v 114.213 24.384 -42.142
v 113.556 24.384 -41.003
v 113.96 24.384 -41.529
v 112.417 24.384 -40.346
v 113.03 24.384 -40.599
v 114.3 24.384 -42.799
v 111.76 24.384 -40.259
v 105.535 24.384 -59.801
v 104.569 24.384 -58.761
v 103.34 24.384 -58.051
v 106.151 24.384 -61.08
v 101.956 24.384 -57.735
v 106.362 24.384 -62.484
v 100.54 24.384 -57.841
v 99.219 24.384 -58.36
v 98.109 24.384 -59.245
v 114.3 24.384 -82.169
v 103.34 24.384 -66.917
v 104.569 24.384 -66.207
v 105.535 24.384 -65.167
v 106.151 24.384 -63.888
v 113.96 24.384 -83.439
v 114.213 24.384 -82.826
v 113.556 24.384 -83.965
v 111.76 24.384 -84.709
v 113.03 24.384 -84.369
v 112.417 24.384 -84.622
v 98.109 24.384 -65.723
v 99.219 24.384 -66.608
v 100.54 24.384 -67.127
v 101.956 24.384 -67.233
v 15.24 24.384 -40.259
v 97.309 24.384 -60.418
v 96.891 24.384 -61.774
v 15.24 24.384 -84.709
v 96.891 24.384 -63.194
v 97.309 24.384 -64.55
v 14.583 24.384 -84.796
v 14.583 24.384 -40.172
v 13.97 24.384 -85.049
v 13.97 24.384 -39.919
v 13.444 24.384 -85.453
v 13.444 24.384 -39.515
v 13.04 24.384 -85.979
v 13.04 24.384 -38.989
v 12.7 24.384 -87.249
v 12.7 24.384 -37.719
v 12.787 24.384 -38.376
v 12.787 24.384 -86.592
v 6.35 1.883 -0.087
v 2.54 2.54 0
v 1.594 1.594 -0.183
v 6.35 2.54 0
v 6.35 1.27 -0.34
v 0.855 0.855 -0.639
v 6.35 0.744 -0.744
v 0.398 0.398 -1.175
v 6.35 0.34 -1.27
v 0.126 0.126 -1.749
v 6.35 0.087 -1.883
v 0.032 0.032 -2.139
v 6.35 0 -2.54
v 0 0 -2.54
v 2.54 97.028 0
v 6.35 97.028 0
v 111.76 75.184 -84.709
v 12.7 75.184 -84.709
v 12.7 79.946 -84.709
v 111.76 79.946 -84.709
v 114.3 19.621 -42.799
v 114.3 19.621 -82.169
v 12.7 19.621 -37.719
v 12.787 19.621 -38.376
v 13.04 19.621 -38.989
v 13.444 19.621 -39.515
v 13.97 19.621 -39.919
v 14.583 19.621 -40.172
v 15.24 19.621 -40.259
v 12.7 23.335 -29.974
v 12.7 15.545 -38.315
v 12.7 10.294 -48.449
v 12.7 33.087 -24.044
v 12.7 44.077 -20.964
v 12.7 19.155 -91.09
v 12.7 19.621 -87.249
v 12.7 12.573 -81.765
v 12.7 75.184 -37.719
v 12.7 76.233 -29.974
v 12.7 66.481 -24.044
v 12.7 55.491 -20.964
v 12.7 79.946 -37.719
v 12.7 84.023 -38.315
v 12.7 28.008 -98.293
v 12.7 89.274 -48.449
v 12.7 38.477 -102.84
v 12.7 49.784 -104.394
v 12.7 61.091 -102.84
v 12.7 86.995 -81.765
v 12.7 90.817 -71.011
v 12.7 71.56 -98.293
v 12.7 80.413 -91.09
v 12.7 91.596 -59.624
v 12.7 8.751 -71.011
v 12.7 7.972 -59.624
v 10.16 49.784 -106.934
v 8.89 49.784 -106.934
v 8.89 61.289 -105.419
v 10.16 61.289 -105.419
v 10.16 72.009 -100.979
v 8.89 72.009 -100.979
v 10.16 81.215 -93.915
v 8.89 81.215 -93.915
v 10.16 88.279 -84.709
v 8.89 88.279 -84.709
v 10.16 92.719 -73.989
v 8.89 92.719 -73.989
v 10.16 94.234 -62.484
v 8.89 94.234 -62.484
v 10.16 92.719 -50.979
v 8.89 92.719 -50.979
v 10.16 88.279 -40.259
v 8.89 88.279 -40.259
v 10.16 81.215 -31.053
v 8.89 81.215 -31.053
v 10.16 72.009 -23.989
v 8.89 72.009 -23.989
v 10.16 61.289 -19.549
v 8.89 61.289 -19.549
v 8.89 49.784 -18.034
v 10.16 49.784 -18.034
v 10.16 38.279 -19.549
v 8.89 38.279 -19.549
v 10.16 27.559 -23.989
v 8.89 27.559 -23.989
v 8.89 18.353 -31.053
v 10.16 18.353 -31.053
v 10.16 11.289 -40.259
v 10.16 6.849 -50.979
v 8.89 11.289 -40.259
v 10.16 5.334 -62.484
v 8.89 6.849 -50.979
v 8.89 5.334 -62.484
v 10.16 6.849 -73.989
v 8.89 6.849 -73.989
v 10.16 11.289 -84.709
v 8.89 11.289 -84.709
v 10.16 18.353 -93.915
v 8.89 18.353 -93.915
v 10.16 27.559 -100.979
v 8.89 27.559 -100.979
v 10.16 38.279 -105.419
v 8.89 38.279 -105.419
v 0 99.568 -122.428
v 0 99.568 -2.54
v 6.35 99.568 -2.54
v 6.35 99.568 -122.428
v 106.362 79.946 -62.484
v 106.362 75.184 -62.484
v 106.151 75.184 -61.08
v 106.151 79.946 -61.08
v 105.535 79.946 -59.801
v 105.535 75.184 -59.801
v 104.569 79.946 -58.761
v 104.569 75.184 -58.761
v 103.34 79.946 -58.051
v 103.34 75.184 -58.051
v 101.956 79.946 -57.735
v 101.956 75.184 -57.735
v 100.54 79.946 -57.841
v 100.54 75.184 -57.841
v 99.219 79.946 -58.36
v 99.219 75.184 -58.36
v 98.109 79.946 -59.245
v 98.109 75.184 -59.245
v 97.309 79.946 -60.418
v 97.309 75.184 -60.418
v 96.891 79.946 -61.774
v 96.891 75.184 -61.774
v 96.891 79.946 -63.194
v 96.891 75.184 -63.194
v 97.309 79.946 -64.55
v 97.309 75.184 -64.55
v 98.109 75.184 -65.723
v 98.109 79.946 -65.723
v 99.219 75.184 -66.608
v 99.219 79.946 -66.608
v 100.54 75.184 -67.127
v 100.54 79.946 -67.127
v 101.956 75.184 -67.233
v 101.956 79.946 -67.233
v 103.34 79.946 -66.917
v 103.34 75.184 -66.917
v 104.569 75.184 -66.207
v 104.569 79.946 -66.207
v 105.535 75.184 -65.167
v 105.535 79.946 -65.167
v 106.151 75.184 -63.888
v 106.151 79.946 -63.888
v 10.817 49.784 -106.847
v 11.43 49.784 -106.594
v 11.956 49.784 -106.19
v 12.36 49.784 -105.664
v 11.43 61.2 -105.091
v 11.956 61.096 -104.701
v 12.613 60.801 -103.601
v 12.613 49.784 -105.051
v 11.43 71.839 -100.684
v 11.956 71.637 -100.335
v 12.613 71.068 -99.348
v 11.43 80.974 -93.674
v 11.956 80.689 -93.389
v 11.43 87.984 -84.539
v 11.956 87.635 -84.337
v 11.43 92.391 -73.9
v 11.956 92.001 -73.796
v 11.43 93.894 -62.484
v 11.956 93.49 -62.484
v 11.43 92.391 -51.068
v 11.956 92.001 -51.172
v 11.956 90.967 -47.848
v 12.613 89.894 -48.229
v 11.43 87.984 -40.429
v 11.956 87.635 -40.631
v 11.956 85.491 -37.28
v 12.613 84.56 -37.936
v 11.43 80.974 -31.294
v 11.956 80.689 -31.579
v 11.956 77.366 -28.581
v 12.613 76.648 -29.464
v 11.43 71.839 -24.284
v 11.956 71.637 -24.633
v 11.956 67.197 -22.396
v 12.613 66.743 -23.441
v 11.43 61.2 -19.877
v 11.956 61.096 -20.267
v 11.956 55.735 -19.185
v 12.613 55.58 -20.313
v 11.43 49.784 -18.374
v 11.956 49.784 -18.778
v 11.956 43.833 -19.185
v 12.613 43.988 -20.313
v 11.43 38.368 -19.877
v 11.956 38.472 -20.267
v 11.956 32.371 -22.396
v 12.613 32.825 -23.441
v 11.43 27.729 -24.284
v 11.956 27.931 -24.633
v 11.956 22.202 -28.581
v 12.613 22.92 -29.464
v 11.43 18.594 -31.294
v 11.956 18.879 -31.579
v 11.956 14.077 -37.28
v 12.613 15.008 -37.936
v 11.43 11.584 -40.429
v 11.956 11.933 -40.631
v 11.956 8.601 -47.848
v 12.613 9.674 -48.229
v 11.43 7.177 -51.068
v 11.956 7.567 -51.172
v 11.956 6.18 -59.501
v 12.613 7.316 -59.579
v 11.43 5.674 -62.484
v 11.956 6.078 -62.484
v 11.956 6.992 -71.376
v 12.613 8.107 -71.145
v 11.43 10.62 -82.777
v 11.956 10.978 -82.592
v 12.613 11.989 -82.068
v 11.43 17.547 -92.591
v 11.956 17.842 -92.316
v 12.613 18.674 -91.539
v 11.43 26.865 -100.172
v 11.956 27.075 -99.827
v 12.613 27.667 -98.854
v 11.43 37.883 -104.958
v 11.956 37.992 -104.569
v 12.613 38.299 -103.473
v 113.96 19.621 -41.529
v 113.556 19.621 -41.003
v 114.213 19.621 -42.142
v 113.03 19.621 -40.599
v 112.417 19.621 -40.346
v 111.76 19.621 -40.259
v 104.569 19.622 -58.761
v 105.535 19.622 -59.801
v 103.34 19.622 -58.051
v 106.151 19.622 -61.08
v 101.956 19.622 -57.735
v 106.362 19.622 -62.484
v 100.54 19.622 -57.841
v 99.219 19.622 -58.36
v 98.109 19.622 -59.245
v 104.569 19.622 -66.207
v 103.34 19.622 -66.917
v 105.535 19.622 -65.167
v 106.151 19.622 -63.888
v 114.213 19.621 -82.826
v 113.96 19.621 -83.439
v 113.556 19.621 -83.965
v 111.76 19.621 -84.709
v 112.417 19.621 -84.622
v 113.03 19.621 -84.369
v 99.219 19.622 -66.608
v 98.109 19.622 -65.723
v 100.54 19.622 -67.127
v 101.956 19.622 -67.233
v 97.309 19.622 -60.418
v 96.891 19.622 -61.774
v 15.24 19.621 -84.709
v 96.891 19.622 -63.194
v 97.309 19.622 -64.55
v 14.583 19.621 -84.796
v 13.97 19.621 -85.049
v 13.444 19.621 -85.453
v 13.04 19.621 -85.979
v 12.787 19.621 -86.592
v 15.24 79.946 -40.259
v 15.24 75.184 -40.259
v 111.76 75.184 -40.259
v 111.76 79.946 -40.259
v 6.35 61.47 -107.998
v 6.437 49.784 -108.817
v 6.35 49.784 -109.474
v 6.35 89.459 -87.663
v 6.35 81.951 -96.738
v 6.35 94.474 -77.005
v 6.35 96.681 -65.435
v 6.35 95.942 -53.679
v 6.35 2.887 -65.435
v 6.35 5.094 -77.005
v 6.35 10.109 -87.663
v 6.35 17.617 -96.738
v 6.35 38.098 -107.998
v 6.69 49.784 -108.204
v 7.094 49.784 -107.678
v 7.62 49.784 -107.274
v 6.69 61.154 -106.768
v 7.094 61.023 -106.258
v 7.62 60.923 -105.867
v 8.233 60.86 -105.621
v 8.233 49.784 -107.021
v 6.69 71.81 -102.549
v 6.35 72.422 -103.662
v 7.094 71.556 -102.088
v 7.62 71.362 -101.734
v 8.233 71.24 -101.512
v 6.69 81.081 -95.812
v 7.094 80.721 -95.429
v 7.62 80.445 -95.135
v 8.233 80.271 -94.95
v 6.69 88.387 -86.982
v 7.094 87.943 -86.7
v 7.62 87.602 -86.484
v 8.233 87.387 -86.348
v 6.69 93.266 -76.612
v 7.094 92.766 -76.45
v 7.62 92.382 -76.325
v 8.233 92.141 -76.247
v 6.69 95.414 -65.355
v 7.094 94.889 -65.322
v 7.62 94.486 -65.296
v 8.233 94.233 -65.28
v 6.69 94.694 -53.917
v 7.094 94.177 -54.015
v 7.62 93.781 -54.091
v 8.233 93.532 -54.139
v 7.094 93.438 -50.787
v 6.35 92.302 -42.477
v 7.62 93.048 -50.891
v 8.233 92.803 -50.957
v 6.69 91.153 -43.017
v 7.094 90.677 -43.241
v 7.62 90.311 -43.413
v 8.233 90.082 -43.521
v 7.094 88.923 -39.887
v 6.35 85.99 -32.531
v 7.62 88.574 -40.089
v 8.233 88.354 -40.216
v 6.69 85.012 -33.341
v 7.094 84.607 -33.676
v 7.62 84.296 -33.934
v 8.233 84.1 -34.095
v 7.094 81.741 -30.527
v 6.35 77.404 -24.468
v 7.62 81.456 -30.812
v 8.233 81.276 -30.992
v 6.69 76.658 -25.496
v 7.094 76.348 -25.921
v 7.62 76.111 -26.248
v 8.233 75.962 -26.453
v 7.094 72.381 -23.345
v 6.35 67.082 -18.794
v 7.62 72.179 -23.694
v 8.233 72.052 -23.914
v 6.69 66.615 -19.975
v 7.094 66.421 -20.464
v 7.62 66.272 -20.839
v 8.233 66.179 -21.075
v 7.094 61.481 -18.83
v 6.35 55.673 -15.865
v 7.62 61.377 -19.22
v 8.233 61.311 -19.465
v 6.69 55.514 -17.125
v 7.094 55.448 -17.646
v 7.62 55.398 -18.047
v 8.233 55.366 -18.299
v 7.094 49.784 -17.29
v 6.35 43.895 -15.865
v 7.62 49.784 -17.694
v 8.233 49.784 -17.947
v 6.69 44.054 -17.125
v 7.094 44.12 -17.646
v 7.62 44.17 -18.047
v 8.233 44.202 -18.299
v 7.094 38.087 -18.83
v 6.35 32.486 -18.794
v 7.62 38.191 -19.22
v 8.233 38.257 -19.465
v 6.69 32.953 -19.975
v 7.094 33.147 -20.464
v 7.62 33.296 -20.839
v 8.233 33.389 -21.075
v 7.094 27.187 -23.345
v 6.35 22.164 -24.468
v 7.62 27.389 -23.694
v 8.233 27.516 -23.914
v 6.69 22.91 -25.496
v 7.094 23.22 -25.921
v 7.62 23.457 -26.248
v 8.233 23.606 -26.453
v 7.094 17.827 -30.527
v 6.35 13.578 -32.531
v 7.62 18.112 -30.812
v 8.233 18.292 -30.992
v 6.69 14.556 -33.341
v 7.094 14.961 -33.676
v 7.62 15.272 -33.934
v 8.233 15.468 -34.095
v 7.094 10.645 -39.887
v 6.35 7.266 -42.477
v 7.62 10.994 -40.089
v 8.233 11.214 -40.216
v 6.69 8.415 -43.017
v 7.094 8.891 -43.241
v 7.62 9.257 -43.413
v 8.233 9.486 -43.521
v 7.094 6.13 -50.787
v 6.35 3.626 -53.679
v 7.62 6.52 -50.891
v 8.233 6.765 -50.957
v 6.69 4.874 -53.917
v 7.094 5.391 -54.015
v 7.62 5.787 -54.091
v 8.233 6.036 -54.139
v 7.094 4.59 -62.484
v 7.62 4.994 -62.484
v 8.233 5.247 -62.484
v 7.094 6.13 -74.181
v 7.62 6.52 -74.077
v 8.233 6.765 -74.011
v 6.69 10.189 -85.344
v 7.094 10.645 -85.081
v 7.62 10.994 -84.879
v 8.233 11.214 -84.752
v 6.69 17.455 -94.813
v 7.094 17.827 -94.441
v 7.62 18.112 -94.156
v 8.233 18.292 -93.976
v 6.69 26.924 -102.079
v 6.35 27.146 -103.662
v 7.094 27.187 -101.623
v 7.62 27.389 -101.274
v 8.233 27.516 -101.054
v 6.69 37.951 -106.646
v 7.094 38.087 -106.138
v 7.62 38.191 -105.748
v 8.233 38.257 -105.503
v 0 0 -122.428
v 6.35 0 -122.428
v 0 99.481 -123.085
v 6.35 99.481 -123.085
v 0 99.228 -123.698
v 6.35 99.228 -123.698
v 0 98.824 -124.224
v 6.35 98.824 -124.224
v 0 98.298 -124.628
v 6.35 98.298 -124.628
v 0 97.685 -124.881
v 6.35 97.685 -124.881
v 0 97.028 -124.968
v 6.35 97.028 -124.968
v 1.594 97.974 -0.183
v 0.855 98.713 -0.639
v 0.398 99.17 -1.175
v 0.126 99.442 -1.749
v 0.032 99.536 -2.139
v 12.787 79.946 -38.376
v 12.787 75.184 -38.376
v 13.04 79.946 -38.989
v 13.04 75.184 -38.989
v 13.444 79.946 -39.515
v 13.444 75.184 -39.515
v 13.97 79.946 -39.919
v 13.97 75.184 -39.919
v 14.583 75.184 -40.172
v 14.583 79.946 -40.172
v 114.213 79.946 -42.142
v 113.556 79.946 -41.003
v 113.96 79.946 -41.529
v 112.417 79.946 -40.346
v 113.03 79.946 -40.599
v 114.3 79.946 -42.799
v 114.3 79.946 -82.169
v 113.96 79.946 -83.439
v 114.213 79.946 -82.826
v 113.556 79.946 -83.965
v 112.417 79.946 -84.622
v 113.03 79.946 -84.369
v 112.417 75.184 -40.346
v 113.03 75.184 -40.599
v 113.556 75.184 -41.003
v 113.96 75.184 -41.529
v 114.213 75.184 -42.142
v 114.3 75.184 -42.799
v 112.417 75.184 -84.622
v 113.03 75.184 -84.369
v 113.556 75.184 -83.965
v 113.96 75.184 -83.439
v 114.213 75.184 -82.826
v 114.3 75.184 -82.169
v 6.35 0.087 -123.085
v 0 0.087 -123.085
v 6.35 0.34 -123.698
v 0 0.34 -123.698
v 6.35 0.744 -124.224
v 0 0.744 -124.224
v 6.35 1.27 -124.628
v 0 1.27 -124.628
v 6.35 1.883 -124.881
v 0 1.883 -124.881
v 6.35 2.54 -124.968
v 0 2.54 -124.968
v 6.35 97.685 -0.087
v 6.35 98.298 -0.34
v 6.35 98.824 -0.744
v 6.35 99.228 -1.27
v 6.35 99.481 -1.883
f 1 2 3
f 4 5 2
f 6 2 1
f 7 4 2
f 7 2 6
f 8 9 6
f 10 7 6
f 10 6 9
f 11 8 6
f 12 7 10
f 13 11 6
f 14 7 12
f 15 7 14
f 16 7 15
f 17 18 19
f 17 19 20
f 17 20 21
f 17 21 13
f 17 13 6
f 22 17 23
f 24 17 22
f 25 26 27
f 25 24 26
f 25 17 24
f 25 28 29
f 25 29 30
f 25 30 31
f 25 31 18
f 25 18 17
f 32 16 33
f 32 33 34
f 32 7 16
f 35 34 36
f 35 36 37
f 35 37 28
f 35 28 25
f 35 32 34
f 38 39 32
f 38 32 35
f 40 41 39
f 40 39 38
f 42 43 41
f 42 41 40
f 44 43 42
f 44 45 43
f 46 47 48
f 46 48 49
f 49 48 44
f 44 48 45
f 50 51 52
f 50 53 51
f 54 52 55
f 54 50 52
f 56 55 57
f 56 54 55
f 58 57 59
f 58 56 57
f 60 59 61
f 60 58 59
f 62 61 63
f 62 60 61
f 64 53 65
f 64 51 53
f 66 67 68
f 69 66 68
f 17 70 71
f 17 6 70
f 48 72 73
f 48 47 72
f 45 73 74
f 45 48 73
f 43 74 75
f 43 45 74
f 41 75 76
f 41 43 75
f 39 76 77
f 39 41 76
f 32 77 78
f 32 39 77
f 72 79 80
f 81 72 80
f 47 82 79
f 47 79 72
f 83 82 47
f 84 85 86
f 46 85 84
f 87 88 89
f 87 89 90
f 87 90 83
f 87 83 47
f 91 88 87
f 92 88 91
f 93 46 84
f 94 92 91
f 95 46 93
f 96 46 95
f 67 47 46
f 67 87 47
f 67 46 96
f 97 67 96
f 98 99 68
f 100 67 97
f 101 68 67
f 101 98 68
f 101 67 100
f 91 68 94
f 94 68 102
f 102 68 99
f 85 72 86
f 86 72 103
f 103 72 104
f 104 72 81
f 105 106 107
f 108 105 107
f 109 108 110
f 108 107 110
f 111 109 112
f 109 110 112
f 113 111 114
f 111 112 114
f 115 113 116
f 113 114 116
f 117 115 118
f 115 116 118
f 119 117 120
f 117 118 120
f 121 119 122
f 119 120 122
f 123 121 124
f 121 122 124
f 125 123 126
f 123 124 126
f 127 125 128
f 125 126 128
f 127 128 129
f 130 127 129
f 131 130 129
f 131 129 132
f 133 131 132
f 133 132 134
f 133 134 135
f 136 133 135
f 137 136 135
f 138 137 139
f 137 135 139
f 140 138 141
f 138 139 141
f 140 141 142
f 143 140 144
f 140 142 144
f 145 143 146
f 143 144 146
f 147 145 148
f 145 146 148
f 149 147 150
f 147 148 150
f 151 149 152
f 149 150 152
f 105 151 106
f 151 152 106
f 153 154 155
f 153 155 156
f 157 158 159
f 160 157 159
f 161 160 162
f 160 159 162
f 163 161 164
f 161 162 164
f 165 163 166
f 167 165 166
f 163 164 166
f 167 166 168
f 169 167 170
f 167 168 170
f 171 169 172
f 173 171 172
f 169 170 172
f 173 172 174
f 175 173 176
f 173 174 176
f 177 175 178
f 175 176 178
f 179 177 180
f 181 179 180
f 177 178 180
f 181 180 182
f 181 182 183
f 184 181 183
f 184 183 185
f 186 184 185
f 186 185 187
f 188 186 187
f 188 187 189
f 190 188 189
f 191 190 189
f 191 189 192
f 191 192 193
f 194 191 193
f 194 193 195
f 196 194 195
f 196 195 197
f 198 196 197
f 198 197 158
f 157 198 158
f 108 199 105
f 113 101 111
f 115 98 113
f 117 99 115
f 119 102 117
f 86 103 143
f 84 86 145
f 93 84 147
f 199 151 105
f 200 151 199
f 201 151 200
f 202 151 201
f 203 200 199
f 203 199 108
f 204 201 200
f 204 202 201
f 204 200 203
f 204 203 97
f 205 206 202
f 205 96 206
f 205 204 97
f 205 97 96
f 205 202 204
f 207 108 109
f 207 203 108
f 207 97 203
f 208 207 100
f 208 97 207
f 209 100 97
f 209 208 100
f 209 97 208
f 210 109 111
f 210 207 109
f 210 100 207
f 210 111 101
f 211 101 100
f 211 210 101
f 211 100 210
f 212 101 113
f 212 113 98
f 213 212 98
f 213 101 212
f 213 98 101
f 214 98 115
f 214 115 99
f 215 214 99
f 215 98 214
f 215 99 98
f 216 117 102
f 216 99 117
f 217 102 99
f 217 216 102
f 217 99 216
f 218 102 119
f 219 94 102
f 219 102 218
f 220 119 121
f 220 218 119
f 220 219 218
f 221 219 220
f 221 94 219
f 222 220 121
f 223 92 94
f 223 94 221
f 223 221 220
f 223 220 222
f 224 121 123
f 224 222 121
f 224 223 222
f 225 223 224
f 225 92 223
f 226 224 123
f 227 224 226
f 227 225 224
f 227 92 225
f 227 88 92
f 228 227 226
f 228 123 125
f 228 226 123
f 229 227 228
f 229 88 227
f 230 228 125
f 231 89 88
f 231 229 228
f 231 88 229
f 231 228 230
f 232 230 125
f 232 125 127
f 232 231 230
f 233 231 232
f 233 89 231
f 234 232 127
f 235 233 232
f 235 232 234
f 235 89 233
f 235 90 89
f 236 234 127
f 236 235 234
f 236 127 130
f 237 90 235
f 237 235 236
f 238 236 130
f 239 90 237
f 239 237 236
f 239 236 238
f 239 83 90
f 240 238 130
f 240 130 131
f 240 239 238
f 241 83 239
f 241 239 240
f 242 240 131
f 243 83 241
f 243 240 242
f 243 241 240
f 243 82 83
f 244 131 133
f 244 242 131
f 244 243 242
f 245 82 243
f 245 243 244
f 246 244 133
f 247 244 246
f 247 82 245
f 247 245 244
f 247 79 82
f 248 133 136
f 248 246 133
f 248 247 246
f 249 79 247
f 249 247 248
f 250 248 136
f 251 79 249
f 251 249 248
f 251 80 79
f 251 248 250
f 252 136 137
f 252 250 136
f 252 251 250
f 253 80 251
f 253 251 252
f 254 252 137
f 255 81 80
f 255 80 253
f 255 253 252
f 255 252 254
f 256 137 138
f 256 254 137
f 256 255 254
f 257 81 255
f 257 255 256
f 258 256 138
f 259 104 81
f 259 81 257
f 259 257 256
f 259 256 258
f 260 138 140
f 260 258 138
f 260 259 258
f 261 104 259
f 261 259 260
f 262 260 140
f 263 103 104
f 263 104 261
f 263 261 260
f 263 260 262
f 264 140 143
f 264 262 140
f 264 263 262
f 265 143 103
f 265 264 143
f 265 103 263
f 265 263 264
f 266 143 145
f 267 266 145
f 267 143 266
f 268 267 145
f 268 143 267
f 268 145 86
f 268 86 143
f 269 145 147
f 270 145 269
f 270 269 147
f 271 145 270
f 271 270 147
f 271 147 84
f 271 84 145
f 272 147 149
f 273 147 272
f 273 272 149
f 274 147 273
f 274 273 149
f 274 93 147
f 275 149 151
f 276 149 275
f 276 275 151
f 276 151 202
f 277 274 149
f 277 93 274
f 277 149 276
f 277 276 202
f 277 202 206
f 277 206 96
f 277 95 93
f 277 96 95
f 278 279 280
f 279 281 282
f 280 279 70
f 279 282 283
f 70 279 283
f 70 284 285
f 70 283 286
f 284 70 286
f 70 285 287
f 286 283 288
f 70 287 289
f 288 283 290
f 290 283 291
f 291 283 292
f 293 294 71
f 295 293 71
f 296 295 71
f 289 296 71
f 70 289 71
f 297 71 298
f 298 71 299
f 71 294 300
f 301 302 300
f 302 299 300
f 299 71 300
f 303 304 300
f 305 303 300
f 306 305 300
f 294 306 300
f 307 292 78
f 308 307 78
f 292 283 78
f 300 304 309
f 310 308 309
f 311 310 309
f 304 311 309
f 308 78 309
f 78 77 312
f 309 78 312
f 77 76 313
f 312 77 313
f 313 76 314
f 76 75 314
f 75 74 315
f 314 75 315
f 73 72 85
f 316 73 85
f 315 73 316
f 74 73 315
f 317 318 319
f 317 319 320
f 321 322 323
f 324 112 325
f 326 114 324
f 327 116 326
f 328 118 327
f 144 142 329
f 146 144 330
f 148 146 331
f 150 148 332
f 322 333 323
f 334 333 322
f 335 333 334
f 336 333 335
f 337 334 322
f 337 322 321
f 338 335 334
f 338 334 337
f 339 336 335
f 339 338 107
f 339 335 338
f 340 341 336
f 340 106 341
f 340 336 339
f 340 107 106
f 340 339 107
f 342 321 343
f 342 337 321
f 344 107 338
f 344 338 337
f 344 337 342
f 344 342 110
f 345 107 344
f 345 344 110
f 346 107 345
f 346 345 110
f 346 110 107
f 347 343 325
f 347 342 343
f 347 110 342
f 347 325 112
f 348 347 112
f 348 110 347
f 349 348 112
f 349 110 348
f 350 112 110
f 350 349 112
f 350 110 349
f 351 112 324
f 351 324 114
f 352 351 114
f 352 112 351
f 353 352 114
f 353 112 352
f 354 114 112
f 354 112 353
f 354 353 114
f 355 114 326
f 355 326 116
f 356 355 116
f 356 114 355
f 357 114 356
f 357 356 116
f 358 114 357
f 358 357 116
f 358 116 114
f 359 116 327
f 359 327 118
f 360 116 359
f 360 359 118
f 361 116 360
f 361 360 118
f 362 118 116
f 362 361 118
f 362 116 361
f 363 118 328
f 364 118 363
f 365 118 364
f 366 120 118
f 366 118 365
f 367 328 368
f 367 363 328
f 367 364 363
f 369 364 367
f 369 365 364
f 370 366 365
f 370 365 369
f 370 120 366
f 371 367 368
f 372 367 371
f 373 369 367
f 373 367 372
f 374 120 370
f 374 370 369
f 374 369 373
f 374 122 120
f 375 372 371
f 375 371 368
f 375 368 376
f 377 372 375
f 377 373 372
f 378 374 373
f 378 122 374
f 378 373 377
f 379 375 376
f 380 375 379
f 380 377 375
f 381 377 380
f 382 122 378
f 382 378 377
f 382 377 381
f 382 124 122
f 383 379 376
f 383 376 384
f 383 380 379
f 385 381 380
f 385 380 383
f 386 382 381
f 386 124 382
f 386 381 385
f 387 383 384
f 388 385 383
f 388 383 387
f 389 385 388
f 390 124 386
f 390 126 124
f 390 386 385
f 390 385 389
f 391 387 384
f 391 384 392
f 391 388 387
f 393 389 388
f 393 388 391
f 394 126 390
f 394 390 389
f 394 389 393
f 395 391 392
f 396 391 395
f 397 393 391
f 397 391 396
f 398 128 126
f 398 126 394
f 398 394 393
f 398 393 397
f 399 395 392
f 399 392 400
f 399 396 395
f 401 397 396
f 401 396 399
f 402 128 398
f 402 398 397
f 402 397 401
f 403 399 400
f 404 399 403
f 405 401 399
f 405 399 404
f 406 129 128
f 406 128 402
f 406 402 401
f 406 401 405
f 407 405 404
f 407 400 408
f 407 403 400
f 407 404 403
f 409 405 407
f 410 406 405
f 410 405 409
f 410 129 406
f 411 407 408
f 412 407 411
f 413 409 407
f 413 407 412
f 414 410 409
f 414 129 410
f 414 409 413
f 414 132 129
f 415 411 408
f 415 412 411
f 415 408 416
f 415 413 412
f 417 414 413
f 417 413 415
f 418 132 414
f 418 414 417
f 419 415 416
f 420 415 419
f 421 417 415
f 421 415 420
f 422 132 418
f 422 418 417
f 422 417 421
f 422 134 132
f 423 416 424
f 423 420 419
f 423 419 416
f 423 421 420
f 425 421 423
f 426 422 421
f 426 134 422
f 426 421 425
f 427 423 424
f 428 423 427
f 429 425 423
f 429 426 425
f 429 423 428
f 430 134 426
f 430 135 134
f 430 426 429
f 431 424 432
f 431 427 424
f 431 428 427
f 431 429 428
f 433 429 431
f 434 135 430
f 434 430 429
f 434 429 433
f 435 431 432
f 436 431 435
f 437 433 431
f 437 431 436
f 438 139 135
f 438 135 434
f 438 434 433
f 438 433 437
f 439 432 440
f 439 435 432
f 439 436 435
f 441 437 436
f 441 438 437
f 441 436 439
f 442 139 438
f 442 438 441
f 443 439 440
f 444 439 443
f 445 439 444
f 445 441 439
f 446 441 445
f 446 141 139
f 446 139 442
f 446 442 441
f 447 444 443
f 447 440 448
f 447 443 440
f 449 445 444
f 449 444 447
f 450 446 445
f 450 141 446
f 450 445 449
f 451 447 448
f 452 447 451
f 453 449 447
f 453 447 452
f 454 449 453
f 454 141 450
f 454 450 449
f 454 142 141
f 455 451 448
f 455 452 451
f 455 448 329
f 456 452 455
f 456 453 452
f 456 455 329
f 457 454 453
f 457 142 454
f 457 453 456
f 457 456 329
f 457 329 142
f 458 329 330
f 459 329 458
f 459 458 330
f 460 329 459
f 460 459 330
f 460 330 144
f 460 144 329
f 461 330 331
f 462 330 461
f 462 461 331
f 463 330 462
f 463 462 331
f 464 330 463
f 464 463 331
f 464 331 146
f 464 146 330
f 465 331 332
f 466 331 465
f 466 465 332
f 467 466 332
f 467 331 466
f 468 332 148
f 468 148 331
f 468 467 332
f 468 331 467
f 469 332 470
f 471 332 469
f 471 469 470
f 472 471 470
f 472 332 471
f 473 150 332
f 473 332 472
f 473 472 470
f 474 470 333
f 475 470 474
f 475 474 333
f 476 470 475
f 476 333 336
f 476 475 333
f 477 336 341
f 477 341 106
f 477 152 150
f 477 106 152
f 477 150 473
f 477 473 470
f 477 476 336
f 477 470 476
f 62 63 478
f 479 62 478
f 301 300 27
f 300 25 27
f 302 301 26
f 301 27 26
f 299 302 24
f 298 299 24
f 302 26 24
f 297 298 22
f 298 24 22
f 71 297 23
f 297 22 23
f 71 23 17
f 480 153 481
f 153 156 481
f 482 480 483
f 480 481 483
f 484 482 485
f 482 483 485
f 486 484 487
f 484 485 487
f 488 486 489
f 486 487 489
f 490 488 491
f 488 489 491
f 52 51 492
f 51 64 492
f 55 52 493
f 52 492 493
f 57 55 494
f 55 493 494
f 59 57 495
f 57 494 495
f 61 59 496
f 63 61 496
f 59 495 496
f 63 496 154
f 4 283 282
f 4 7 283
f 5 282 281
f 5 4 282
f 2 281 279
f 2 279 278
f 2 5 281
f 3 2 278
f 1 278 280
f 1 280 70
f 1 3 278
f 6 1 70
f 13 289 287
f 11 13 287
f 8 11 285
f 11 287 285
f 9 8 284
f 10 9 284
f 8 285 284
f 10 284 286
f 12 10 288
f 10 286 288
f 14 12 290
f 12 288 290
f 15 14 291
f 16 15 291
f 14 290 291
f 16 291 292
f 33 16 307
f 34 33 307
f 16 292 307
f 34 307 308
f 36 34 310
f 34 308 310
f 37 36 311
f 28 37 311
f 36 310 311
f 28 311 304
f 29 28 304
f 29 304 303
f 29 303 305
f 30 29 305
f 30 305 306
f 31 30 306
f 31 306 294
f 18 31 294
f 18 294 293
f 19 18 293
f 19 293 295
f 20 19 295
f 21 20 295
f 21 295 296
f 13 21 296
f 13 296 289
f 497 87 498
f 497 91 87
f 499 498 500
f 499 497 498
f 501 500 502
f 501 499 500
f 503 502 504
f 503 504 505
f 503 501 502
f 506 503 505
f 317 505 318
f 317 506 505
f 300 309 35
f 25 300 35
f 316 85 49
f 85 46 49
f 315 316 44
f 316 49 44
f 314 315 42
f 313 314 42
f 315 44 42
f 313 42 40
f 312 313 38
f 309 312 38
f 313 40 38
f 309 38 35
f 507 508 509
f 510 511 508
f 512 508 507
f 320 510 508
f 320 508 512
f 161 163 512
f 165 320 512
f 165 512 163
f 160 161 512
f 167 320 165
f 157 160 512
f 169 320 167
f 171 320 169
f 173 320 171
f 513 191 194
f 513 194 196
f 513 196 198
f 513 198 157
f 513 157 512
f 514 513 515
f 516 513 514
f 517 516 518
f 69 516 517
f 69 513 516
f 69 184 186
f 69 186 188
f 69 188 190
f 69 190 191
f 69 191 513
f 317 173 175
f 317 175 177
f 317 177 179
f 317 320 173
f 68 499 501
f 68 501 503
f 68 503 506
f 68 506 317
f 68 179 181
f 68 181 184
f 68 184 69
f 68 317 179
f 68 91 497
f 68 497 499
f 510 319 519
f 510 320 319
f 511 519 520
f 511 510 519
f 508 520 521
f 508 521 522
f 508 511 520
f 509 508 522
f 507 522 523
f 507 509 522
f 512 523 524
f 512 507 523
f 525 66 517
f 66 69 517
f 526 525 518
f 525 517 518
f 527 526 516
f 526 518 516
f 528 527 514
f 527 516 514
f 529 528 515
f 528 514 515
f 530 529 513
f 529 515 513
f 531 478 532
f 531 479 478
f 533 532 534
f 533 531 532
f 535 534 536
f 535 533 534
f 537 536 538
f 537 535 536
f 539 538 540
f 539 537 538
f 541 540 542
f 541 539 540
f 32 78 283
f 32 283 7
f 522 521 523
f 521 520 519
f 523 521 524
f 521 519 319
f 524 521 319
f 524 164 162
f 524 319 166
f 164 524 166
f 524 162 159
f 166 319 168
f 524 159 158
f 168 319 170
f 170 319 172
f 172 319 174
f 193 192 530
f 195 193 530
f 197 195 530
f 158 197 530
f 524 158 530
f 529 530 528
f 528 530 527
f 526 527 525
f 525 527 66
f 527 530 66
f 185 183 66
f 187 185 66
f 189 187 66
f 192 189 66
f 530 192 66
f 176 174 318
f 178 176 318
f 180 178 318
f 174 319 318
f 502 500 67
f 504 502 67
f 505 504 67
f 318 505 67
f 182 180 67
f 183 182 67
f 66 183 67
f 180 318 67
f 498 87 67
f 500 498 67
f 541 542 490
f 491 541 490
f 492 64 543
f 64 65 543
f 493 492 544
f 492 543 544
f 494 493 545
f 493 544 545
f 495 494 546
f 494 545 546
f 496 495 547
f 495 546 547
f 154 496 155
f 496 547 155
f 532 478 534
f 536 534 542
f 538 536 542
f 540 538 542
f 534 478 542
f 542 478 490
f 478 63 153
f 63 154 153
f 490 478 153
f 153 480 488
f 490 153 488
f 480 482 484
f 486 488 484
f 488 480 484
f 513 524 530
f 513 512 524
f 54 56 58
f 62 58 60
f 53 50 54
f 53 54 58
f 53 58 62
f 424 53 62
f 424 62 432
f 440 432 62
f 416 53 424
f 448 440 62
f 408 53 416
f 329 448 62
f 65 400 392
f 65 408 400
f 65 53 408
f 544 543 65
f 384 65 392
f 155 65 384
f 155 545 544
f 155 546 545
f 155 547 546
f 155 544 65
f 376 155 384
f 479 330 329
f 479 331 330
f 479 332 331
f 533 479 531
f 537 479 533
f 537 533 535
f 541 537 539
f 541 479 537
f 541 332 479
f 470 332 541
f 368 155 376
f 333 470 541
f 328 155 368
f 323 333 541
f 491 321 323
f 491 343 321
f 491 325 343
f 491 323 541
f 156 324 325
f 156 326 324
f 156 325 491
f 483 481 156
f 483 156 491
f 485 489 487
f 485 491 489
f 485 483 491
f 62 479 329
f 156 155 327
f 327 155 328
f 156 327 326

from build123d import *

# Parameters (mm, degrees)
SKETCH1_W           = 124.968
SKETCH1_H           = 99.568
BOSS_EXTRUDE1_DEPTH = 6.35
SKETCH2_R           = 44.45
BOSS_EXTRUDE2_DEPTH = 6.35
SKETCH3_W           = 44.45
SKETCH3_H           = 4.7625
BOSS_EXTRUDE3_DEPTH = 101.6
SKETCH4_R           = 4.7625
CUT_EXTRUDE1_DEPTH  = 80.9465
FILLET1_R           = 2.54


with BuildPart() as part:
    # Sketch1 → Boss-Extrude1 (new body)
    with BuildSketch(Plane(origin=(0, 0, 0), x_dir=(0, 0, -1), z_dir=(1, 0, 0))):
        with Locations((62.484, 49.784)):
            Rectangle(SKETCH1_W, SKETCH1_H)
    extrude(amount=BOSS_EXTRUDE1_DEPTH)

    # Sketch2 → Boss-Extrude2 (add)
    with BuildSketch(Plane(origin=(6.35, 0, 0), x_dir=(0, 0, -1), z_dir=(1, 0, 0))):
        with Locations((62.484, 49.784)):
            Circle(SKETCH2_R)
    extrude(amount=BOSS_EXTRUDE2_DEPTH)

    # Sketch3 → Boss-Extrude3 (add)
    with BuildSketch(Plane(origin=(12.7, 0, 0), x_dir=(0, 0, -1), z_dir=(1, 0, 0))):
        with Locations((62.484, 77.56525)):
            Rectangle(SKETCH3_W, SKETCH3_H)
        with Locations((62.484, 22.00275)):
            Rectangle(SKETCH3_W, SKETCH3_H)
    extrude(amount=BOSS_EXTRUDE3_DEPTH)

    # Sketch4 → Cut-Extrude1 (cut, through all)
    with BuildSketch(Plane.XZ.offset(-19.6215)):
        with Locations((101.6, -62.484)):
            Circle(SKETCH4_R)
    extrude(amount=-CUT_EXTRUDE1_DEPTH, mode=Mode.SUBTRACT)

    # Fillet1
    fillet1_edges = [part.edges().sort_by_distance(p)[0] for p in [
        (6.35, 49.784, -18.034),
        (12.7, 49.784, -18.034),
        (12.7, 77.56525, -40.259),
        (114.3, 77.56525, -84.709),
        (114.3, 77.56525, -40.259),
        (12.7, 22.00275, -84.709),
        (12.7, 22.00275, -40.259),
        (114.3, 22.00275, -84.709),
        (114.3, 22.00275, -40.259),
        (0, 49.784, 0),
        (3.175, 99.568, 0),
        (3.175, 99.568, -124.968),
        (3.175, 0, -124.968),
        (3.175, 0, 0),
    ]]
    fillet(fillet1_edges, radius=FILLET1_R)


solid = part.part
